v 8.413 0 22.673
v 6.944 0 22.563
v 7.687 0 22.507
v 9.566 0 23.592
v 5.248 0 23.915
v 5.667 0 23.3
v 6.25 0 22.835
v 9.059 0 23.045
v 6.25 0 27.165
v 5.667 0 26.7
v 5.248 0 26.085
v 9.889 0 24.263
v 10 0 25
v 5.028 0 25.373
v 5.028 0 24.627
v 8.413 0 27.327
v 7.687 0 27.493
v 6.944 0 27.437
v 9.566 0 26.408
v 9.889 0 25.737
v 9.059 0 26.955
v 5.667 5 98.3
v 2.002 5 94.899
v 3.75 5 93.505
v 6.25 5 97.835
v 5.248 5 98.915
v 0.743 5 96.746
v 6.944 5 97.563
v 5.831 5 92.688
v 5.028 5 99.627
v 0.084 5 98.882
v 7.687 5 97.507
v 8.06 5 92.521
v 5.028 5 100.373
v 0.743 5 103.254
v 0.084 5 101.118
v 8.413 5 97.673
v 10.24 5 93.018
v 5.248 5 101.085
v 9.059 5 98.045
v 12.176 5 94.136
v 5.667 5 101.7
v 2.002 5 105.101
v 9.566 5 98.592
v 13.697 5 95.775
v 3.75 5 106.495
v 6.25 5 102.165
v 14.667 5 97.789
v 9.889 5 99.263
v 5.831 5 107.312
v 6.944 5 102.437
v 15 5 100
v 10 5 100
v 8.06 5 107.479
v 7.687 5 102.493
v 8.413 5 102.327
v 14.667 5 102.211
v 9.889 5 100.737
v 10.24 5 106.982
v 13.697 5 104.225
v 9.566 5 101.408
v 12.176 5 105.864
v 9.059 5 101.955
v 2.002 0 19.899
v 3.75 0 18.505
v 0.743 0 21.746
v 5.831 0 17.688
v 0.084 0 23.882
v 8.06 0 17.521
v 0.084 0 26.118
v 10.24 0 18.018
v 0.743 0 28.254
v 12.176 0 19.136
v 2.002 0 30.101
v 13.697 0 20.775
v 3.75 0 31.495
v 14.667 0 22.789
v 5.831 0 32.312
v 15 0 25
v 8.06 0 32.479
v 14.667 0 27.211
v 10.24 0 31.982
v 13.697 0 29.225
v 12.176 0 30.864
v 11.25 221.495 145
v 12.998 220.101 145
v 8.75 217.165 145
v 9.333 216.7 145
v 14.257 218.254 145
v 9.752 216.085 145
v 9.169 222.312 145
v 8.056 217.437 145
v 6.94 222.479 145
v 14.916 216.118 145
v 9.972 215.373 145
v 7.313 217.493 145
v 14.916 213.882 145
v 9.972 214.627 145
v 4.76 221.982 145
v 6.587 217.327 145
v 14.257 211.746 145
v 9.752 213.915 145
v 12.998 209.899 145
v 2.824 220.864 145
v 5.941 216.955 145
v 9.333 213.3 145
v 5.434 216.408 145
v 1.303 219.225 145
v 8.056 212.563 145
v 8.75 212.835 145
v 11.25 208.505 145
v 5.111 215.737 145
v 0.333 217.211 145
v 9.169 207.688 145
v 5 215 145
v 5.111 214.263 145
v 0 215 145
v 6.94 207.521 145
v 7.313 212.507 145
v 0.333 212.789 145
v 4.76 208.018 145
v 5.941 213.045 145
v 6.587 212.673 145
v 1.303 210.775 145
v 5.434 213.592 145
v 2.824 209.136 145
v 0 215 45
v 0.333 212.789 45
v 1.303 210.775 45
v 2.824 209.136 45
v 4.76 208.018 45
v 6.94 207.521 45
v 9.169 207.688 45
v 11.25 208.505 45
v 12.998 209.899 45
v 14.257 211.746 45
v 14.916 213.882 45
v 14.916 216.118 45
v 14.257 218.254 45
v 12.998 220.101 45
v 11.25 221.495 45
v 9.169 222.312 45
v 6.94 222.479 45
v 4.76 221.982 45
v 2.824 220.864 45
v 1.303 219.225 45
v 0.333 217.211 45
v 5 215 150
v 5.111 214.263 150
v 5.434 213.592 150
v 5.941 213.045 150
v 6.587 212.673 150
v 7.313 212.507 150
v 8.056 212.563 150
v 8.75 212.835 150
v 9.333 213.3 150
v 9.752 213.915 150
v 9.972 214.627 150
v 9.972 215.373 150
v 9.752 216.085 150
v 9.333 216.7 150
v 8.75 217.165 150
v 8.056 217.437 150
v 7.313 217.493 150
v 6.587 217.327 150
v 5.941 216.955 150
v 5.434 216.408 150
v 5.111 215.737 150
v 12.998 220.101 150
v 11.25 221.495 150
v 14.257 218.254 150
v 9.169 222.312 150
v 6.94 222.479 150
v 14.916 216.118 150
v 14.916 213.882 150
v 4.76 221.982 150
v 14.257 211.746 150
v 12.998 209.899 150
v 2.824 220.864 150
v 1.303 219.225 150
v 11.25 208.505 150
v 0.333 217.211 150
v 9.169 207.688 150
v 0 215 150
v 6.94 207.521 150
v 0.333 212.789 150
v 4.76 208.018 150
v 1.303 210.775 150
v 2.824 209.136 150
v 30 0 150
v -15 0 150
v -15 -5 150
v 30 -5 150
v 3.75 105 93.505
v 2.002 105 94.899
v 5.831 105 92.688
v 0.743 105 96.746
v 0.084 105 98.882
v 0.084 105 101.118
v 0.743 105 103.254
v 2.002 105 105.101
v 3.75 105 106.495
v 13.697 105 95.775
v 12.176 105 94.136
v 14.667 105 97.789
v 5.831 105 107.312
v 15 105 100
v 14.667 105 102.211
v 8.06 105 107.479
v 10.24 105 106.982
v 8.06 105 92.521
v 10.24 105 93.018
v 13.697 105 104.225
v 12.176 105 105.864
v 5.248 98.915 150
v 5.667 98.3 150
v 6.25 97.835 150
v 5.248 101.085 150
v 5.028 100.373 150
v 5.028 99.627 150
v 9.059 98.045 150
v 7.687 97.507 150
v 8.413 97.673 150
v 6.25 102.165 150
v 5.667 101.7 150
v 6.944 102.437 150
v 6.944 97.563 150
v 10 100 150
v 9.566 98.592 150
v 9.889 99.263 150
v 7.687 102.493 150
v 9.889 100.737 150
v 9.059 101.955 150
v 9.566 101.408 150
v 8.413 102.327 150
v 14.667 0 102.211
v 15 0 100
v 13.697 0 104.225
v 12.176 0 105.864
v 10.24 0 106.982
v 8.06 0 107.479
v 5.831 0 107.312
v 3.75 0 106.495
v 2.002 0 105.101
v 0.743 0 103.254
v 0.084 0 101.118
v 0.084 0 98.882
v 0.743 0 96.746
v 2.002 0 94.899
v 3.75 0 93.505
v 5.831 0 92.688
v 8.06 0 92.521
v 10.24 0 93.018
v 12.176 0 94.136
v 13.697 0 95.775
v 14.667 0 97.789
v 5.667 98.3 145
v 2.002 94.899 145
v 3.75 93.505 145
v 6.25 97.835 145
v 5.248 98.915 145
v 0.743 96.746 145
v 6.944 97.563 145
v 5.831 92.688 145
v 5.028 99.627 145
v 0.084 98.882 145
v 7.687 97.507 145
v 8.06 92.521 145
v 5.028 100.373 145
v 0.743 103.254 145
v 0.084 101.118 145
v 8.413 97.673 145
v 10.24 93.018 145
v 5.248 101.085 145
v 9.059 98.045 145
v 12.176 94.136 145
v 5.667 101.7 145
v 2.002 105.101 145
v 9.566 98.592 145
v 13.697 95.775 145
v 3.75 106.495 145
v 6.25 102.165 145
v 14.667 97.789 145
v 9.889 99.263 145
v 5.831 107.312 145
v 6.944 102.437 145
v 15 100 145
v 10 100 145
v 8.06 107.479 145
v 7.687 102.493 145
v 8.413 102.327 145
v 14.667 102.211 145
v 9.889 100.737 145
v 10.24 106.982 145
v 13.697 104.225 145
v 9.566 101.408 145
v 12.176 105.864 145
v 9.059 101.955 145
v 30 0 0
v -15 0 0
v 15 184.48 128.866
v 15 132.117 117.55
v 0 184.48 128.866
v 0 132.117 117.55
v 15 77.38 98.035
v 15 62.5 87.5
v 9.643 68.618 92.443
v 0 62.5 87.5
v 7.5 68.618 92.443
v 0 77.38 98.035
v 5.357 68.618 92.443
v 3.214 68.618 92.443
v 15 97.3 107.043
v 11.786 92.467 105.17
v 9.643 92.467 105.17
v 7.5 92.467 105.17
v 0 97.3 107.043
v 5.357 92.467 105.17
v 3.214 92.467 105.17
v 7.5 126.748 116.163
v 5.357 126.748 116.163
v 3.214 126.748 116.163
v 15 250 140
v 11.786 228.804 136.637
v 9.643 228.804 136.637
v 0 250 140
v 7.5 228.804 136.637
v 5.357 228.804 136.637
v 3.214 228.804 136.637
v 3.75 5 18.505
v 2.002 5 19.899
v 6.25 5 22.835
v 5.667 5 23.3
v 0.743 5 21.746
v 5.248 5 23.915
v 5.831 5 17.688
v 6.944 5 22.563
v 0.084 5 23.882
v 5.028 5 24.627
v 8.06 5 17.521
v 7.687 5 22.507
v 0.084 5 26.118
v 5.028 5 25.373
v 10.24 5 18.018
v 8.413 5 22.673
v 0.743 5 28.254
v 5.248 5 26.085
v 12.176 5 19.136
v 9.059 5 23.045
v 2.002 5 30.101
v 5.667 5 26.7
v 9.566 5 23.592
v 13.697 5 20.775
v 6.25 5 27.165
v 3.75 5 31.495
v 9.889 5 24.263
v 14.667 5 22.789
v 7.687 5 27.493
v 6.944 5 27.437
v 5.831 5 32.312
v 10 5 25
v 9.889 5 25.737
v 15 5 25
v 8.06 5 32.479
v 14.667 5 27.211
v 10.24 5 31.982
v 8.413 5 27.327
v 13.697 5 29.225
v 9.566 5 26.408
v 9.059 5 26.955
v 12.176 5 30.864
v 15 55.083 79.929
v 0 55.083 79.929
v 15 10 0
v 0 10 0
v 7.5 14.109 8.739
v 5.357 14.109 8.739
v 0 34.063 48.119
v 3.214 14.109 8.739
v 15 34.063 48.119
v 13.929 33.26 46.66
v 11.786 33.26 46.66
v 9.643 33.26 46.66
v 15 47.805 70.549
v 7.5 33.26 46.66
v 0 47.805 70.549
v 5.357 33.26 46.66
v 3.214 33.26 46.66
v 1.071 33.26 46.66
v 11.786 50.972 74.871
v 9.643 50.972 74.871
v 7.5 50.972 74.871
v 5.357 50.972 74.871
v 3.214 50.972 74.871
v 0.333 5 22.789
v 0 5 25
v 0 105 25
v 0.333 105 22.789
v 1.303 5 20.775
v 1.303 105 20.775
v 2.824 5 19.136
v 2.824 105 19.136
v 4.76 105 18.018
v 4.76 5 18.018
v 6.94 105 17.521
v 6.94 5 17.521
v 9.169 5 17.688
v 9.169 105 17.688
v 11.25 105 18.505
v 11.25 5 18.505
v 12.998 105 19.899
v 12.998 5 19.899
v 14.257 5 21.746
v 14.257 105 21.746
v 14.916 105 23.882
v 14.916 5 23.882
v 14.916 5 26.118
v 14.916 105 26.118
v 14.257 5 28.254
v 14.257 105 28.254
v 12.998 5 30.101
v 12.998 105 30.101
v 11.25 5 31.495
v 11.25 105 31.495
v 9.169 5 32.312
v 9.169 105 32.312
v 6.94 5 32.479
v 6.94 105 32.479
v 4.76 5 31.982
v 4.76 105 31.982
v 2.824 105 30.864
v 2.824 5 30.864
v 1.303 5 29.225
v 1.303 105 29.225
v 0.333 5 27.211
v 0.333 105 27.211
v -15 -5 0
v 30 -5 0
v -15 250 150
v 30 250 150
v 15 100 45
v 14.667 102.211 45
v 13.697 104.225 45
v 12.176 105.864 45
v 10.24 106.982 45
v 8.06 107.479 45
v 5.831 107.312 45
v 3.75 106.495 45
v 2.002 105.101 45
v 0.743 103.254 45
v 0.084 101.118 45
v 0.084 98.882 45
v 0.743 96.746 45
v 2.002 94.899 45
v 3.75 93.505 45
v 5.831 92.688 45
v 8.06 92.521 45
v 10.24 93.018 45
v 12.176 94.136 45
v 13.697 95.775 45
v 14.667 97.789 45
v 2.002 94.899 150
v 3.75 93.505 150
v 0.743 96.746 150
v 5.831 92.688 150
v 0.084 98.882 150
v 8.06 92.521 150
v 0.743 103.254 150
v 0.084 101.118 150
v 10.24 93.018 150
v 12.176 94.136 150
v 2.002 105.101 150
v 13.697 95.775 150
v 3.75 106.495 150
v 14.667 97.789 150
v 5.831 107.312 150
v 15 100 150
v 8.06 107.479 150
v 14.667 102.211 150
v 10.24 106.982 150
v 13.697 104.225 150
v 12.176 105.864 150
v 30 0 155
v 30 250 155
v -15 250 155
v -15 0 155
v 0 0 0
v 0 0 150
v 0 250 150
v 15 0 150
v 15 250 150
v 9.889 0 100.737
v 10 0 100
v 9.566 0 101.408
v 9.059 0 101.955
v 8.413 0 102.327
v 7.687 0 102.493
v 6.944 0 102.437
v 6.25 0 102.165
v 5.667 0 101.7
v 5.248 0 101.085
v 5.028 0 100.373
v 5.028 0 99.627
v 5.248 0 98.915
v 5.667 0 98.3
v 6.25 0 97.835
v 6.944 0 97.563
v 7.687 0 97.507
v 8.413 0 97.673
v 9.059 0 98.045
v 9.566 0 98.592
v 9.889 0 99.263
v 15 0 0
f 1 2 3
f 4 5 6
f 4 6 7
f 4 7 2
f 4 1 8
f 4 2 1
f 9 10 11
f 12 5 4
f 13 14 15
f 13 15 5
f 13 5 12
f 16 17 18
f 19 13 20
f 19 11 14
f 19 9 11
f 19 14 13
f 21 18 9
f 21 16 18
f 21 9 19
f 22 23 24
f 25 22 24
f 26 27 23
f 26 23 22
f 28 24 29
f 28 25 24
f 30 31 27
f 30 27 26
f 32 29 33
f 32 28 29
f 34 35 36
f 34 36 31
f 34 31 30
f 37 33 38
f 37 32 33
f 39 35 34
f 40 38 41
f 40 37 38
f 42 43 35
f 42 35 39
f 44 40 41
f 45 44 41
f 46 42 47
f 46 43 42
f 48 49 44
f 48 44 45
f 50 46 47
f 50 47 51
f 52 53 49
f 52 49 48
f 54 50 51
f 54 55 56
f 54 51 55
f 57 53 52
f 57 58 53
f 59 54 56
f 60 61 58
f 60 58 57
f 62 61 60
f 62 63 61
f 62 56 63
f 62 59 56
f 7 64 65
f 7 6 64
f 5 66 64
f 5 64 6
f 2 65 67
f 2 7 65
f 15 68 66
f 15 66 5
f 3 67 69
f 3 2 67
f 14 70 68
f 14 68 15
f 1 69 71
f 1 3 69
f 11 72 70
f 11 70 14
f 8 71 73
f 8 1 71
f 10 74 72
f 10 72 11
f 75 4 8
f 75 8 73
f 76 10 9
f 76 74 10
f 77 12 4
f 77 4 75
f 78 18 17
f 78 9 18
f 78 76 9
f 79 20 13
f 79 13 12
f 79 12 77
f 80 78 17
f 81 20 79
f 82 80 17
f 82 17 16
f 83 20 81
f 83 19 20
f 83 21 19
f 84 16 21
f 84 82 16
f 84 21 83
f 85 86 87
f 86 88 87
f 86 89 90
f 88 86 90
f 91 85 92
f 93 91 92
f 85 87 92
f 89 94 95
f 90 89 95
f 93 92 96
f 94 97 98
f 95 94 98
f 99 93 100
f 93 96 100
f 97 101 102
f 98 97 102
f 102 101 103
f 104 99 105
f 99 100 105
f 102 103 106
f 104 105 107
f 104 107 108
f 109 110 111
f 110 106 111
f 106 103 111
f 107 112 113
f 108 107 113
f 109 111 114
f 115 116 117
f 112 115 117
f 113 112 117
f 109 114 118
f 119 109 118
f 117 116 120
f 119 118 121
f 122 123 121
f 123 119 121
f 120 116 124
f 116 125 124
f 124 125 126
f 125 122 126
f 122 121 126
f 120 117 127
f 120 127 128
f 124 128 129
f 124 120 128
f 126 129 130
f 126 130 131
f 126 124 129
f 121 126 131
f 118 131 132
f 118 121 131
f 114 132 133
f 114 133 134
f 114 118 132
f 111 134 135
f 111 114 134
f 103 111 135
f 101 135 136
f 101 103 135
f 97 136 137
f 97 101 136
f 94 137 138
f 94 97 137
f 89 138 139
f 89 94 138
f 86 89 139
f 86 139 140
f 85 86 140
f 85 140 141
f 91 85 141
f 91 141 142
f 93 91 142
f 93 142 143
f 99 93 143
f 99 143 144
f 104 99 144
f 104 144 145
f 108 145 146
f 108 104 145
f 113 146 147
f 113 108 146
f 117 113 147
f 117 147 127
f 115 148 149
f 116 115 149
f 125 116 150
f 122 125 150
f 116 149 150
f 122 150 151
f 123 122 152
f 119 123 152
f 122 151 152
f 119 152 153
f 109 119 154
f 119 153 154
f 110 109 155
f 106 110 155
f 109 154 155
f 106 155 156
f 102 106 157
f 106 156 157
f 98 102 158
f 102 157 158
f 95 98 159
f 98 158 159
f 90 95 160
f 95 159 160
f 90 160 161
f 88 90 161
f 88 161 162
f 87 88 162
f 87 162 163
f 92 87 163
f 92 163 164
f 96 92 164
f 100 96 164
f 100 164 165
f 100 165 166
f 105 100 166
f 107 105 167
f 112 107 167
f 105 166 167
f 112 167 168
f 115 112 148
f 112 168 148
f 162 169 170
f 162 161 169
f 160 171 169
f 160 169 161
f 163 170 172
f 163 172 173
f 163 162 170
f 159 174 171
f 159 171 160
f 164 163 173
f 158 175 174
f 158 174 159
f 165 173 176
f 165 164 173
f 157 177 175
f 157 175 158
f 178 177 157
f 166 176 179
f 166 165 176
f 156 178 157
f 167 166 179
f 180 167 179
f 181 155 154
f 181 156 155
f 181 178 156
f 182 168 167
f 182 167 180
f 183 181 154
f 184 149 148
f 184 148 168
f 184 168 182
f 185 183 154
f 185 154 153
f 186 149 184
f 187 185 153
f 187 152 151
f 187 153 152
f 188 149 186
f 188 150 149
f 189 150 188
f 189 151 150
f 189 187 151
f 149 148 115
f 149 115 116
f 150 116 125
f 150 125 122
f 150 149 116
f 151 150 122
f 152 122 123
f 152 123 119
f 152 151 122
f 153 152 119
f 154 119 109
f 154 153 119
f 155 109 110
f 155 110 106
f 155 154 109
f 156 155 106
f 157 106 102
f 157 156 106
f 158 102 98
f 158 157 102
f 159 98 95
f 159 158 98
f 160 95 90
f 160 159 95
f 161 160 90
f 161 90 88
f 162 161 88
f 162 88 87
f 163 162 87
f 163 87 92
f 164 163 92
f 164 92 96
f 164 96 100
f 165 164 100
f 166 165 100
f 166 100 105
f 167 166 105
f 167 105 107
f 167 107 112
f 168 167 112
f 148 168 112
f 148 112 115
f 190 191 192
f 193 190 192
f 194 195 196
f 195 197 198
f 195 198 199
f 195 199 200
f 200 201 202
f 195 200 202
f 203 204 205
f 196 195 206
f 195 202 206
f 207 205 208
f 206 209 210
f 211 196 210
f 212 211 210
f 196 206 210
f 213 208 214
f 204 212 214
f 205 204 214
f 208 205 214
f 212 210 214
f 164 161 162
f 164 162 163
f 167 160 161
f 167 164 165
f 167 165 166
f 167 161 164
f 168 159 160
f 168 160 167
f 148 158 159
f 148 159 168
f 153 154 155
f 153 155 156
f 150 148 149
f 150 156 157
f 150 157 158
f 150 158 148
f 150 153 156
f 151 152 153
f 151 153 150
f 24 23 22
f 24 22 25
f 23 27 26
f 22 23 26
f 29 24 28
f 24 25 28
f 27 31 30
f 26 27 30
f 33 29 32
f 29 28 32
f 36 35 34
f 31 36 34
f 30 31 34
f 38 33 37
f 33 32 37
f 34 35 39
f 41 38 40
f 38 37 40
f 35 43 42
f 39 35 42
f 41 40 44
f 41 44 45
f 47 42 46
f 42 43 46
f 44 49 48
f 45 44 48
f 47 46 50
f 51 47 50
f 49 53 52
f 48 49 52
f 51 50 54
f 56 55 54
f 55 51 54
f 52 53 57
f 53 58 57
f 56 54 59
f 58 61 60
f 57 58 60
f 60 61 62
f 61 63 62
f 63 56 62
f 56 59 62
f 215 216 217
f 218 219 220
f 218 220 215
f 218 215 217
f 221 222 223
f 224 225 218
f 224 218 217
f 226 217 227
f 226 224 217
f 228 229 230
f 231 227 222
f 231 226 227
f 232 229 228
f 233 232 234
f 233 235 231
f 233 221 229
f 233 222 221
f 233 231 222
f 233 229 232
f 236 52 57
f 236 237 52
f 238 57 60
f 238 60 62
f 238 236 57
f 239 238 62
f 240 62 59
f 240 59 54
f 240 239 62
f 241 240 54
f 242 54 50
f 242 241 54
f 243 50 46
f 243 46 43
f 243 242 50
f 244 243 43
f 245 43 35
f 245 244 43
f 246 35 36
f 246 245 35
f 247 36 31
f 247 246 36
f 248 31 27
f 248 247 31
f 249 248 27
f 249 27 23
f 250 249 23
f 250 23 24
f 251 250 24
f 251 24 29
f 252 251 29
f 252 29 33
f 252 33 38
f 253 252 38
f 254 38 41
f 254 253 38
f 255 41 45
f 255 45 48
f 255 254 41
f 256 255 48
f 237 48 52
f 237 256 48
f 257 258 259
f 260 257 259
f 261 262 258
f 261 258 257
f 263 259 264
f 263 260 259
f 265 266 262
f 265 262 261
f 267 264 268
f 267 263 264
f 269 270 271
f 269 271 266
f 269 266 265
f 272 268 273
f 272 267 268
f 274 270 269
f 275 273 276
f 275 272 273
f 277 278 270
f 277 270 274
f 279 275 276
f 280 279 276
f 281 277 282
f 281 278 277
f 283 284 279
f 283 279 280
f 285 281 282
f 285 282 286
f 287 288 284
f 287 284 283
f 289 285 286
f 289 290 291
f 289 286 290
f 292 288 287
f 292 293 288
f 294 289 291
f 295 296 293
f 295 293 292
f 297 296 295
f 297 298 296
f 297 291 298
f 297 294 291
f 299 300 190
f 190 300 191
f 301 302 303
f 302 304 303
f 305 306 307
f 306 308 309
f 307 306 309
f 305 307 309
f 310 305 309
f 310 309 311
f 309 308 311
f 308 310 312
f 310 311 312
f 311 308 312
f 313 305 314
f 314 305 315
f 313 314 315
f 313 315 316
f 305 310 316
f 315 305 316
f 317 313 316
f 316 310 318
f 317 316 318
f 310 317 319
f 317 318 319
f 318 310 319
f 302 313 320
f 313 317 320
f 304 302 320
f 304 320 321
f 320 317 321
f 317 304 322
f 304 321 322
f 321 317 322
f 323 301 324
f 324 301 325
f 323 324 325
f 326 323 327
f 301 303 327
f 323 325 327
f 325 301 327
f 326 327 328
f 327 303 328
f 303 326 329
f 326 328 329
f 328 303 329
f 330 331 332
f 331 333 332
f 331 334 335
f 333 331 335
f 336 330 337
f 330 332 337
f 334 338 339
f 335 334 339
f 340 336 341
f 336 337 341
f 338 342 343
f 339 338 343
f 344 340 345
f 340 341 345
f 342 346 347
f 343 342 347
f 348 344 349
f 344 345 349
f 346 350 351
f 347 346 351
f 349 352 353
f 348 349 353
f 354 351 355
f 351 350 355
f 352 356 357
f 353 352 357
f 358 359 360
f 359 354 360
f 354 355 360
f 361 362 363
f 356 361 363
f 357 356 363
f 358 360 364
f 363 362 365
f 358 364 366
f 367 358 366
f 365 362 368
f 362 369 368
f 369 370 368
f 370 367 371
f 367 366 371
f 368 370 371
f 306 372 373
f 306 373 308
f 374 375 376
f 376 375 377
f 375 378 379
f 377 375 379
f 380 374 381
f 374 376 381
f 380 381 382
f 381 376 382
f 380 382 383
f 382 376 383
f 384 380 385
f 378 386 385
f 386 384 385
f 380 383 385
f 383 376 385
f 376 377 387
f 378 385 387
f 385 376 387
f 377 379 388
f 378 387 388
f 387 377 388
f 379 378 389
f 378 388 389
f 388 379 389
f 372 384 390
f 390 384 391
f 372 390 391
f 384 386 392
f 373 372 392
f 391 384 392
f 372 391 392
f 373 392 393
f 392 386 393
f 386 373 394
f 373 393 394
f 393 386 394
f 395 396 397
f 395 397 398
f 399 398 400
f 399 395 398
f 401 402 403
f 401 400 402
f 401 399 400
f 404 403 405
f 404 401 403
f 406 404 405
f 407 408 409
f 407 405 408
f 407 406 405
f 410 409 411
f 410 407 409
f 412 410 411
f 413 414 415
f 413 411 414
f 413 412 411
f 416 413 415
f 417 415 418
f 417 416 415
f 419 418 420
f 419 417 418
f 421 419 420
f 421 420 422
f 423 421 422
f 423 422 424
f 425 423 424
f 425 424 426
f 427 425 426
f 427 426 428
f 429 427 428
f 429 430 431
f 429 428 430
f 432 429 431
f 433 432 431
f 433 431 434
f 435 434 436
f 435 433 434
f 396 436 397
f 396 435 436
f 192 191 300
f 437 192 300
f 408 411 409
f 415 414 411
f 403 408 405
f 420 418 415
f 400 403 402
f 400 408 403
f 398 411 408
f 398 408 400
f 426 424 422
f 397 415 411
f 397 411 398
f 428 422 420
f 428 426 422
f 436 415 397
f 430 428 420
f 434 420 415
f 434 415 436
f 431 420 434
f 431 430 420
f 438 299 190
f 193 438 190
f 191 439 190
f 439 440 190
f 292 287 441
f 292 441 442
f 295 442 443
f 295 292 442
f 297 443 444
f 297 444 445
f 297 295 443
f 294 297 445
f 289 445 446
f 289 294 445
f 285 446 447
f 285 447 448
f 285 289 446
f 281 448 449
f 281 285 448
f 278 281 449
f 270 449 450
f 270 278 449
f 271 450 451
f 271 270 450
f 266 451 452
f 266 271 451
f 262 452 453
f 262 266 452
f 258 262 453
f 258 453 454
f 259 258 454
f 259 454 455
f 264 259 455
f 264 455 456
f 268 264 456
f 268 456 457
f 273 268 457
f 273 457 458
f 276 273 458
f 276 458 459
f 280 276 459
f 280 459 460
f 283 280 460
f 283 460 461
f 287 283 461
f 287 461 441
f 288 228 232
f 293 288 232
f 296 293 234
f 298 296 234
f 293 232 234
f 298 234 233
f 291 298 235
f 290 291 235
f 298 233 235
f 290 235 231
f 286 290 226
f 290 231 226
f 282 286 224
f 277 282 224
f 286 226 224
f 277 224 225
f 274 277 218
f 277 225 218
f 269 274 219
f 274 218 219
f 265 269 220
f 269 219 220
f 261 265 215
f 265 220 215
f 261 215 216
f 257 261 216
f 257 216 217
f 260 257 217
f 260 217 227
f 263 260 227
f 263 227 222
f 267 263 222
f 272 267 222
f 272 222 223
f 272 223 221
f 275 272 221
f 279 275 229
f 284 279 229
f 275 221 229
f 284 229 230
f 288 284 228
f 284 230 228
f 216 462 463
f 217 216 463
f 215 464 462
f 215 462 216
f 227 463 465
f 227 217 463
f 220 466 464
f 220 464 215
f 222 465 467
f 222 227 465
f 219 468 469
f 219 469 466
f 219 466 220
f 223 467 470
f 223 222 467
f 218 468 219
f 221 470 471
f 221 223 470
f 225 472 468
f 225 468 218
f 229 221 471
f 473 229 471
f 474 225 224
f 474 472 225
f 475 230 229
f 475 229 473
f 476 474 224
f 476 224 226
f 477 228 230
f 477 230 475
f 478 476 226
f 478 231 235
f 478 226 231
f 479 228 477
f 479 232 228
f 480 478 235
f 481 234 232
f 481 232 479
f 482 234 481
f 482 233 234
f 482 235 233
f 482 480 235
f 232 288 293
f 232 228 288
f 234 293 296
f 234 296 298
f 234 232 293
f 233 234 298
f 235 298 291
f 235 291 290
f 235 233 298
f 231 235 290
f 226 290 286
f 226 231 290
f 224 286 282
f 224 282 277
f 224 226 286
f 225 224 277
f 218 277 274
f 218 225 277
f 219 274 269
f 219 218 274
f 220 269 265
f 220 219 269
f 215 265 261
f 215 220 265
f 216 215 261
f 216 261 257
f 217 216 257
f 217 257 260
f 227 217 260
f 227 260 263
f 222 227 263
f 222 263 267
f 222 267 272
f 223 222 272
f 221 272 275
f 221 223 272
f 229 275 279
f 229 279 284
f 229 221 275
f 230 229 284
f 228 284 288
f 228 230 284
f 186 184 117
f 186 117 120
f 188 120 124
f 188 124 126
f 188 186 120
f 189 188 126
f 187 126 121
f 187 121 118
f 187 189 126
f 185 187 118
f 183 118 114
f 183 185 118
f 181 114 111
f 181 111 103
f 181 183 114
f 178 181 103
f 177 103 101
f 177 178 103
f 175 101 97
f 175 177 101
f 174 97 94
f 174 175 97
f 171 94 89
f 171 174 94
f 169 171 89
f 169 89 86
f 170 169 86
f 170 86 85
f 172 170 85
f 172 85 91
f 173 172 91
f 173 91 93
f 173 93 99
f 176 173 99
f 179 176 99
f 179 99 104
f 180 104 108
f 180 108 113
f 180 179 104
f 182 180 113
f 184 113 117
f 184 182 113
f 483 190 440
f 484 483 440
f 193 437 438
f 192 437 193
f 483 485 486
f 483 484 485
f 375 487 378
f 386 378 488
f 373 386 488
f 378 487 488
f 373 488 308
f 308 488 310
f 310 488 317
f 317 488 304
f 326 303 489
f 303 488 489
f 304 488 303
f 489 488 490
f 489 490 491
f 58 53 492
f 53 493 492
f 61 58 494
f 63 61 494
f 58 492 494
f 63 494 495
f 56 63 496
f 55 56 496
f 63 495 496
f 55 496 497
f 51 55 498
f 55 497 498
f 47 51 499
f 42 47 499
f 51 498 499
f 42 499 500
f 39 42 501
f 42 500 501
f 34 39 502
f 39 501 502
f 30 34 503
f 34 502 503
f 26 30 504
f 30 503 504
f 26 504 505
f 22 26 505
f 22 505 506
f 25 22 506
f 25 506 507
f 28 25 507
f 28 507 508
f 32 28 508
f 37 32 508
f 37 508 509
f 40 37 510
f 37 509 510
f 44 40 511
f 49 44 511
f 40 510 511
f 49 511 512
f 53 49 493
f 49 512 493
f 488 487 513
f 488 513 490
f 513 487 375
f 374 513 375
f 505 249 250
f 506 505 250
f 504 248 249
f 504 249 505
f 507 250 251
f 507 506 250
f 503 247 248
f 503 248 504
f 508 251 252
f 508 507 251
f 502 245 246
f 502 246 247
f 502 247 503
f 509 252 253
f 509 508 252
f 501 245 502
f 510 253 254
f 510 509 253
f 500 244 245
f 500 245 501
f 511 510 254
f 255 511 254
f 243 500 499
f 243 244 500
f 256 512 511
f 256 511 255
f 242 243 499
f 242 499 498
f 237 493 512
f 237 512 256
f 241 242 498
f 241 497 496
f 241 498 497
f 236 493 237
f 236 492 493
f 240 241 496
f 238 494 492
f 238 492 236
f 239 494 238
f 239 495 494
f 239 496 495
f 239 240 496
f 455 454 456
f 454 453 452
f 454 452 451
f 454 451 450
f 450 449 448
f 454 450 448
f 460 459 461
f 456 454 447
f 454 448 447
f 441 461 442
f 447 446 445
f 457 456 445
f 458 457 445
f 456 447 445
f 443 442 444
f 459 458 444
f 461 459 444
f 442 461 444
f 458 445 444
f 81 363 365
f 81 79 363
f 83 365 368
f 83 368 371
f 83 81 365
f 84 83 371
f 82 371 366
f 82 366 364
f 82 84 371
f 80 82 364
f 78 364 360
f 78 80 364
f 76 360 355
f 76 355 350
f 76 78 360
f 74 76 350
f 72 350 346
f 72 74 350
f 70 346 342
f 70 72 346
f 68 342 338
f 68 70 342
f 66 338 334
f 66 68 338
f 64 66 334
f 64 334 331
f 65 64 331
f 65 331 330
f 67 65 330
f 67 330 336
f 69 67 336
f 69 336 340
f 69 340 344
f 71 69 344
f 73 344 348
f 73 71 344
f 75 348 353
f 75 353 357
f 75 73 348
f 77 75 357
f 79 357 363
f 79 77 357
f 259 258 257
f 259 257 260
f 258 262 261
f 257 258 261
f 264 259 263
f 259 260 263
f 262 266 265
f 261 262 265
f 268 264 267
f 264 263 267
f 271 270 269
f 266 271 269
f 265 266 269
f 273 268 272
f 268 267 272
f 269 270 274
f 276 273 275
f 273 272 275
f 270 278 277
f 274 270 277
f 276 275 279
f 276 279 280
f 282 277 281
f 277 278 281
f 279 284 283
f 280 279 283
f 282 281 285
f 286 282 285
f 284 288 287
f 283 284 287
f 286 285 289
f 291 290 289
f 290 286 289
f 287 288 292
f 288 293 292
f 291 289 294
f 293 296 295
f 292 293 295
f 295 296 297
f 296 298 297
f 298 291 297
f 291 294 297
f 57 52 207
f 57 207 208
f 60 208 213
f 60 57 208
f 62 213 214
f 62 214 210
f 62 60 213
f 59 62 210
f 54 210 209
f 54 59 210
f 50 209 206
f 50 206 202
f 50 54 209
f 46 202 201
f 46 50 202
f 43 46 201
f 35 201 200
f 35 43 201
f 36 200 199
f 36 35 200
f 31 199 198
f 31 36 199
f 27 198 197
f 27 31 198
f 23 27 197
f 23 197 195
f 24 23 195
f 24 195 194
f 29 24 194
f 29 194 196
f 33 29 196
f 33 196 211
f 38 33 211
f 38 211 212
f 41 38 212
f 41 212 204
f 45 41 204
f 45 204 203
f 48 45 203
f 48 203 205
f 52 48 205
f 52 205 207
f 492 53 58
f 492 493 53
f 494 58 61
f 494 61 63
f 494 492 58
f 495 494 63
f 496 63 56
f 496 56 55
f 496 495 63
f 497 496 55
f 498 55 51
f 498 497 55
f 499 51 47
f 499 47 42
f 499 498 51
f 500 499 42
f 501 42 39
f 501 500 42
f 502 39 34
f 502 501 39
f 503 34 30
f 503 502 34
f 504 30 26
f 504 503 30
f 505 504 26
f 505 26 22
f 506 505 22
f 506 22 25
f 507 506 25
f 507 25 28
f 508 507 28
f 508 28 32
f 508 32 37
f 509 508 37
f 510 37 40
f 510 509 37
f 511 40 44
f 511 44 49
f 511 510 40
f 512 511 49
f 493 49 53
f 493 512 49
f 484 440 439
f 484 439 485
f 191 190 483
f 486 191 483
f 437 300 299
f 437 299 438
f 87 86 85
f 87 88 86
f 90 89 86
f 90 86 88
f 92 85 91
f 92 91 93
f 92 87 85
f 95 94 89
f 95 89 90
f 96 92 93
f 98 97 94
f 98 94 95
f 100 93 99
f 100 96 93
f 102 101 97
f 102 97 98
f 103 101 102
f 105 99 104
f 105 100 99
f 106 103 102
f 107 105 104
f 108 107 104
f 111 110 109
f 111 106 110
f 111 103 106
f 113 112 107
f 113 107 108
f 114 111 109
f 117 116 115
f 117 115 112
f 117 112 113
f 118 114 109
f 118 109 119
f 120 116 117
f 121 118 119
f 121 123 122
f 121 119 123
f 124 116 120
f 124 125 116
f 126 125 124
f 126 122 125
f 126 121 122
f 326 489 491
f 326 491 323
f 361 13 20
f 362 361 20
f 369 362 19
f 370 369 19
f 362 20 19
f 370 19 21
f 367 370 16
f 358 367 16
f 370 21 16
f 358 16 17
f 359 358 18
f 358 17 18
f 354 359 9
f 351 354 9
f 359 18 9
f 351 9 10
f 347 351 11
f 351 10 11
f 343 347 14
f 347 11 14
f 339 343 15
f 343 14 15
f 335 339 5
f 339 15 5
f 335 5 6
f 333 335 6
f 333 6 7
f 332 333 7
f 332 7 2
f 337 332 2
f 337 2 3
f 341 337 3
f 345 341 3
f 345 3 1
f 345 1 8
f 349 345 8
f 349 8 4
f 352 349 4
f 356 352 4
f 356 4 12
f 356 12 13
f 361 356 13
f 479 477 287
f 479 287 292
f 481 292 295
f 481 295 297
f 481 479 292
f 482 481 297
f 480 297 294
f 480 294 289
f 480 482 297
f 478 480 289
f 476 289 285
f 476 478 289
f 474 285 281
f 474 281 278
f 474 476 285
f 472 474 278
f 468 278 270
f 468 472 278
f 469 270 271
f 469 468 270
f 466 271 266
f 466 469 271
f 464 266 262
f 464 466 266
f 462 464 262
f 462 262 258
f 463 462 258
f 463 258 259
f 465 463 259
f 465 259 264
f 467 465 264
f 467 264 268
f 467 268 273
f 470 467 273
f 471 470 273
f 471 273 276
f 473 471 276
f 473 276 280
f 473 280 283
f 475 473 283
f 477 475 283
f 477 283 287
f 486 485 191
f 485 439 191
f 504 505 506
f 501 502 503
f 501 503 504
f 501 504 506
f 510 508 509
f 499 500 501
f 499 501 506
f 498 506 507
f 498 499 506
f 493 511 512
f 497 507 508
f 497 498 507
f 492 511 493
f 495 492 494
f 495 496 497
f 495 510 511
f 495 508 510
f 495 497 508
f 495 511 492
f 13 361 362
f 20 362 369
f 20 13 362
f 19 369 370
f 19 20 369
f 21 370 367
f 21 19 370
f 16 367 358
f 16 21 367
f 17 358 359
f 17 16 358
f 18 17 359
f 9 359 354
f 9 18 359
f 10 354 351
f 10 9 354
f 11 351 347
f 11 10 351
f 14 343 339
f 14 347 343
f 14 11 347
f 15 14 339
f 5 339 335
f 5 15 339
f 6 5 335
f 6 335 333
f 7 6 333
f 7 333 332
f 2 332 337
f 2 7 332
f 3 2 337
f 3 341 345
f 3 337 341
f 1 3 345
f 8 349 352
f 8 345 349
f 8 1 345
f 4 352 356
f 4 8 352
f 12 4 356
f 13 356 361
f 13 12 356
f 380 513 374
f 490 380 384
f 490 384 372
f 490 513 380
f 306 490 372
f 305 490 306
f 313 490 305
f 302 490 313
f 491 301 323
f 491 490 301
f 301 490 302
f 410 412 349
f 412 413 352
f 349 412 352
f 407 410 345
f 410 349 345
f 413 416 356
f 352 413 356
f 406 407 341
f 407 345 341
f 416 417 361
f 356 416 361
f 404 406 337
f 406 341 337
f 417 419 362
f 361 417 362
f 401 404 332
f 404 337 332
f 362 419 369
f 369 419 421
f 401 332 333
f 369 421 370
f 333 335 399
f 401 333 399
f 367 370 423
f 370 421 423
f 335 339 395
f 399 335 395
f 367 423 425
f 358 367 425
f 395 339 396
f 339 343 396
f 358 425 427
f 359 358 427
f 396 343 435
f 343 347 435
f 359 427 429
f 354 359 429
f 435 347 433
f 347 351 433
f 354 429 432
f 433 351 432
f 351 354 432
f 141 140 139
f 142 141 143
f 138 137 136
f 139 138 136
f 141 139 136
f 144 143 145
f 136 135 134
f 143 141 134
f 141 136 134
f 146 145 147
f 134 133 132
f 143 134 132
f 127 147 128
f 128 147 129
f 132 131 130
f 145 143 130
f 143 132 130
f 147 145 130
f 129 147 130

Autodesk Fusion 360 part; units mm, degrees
sketch "Sketch1" plane through (0, 0, 0) normal (1, 0, 0) x (0, 1, 0)
  line L0 (0, 0) -> (0, 150)
  line L1 (0, 150) -> (250, 150)
  line L2 (0, 150) -> (125, 25) construction
  line L3 (250, 150) -> (250, 140)
  line L4 (0, 0) -> (10, 0)
  spline S0 degree 5 poles (10, 0) (12.7675, 5.9452) (18.1969, 17.4133) (26.0252, 33.3492) (35.807, 52.0174) (47.3001, 70.9752) (59.009, 85.6945) (73.4467, 97.0686) (93.9845, 106.6977) (121.6234, 115.3853) (156.7317, 123.6963) (190.5953, 130.2378) (219.1077, 135.1262) (239.4759, 138.3768) (250, 140) knots 0 0 0 0 0 0 0.1 0.2 0.3 0.4 0.5 0.6 0.7 0.8 0.9 1 1 1 1 1 1
  line L5 (47.5613, 74.1192) -> (77.4387, 100.8808)
  point P0 (62.5, 87.5)
  dimension "d1" = 150
  dimension "d2" = 250
extrude "Extrude1" add sketch "Sketch1" along normal blind 15 makes body 1
sketch "Sketch2" plane through (0, 0, 150) normal (0, 0, 1) x (-1, 0, 0)
  line L0 (0, -250) -> (0, 0)
  line L1 (0, 0) -> (-15, 0)
  line L2 (-15, 0) -> (-15, -250)
  line L3 (-15, -250) -> (0, -250)
  line L4 (0, 0) -> (-15, 0)
  line L5 (-15, 0) -> (-15, -250)
  line L6 (0, -250) -> (0, 0)
  line L7 (0, -250) -> (-15, -250)
sketch "Sketch3" plane through (0, 0, 0) normal (0, -1, 0) x (1, 0, 0)
  line L0 (0, 150) -> (0, 0)
  line L1 (0, 0) -> (15, 0)
  line L2 (15, 0) -> (15, 150)
  line L3 (15, 150) -> (0, 150)
  line L4 (0, 150) -> (15, 150)
  line L5 (15, 0) -> (0, 0)
  line L6 (15, 150) -> (15, 0)
sketch "Sketch4" plane through (0, 0, 150) normal (0, 0, 1) x (-1, 0, 0)
  circle A0 centre (-7.5, -215) radius 7.5
  circle A1 centre (-7.5, -215) radius 2.5
sketch "Sketch8" plane through (0, 0, 150) normal (0, 0, 1) x (1, 0, 0)
  circle A0 centre (7.5, 100) radius 7.5
  circle A1 centre (7.5, 100) radius 2.5
extrude "Extrude2" add sketch "Sketch4" against normal blind 5 separate body makes body 2
extrude "Extrude3" add sketch "Sketch8" against normal blind 5 separate body makes body 3
sketch "Sketch9" plane through (0, 0, 0) normal (0, -1, 0) x (1, 0, 0)
  circle A0 centre (7.5, 25) radius 7.5
  circle A1 centre (7.5, 25) radius 2.5
  circle A2 centre (7.5, 100) radius 7.5
  circle A3 centre (7.5, 100) radius 2.5
  dimension "d10" = 15
extrude "Extrude4" add sketch "Sketch9" against normal blind 5 separate body contours A0 makes body 4
extrude "Extrude5" add sketch "Sketch9" against normal blind 5 separate body contours A2 makes body 5
extrude "Extrude1'" add sketch "Sketch3" along normal blind 5 separate body makes body 6 in component "Vägg"
extrude "Extrude2'" add 1 faces at (0, -1.6667, 100) along direction (-1, 0, 0) blind 15 on bodies 6 bodies 6 in component "Vägg"
extrude "Extrude3'" add 1 faces at (15, -1.6667, 50) along direction (1, 0, 0) blind 15 on bodies 6 bodies 6 in component "Vägg"
extrude "Extrude1''" add sketch "Sketch2" along normal blind 5 separate body makes body 7 in component "Hyllplan"
extrude "Extrude2''" add 1 faces at (15, 83.3333, 151.6667) along direction (1, 0, 0) blind 15 on bodies 7 bodies 7 in component "Hyllplan"
extrude "Extrude3''" add 1 faces at (0, 166.6667, 151.6667) along direction (-1, 0, 0) blind 15 on bodies 7 bodies 7 in component "Hyllplan"
sketch "Sketch10" plane through (0, 5, 0) normal (0, 1, 0) x (-1, 0, 0)
  circle A0 centre (-7.5, 25) radius 2.5
  circle A1 centre (-7.5, 25) radius 7.5
  circle A2 centre (-7.5, 25) radius 7.5
extrude "Extrude1'''" add sketch "Sketch10" along normal blind 100 separate body makes body 8 in component "SkruvClearance"
extrude "Extrude2'''" add sketch "Sketch9" against normal blind 105 contours A1 bodies 8 in component "SkruvClearance"
extrude "Extrude1''''" add 1 faces at (13.2961, 5, 99.5032) along direction (0, 1, 0) blind 100 separate body on bodies 5 makes body 9 in component "SkruvClearance (1)"
extrude "Extrude2''''" add sketch "Sketch9" against normal blind 105 contours A3 bodies 9 in component "SkruvClearance (1)"
extrude "Extrude1'''''" add 1 faces at (13.2961, 99.5032, 145) along direction (0, 0, -1) blind 100 separate body on bodies 3 makes body 10 in component "SkruvClearance (2)"
extrude "Extrude2'''''" add sketch "Sketch8" against normal blind 105 contours A1 bodies 10 in component "SkruvClearance (2)"
extrude "Extrude1''''''" add 1 faces at (1.8427, 213.6449, 145) along direction (0, 0, -1) blind 100 separate body on bodies 2 makes body 11 in component "SkruvClearance (3)"
extrude "Extrude2''''''" add sketch "Sketch4" against normal blind 105 contours A1 bodies 11 in component "SkruvClearance (3)"
component "Vägg" placed x (1, 0, 0) y (0, 1, 0) z (0, 0, 1) at (0, 0, 0)
component "Hyllplan" placed x (1, 0, 0) y (0, 1, 0) z (0, 0, 1) at (0, 0, 0)
component "SkruvClearance" placed x (1, 0, 0) y (0, 1, 0) z (0, 0, 1) at (0, 0, 0)
component "SkruvClearance (1)" placed x (1, 0, 0) y (0, 1, 0) z (0, 0, 1) at (0, 0, 0)
component "SkruvClearance (2)" placed x (1, 0, 0) y (0, 1, 0) z (0, 0, 1) at (0, 0, 0)
component "SkruvClearance (3)" placed x (1, 0, 0) y (0, 1, 0) z (0, 0, 1) at (0, 0, 0)
